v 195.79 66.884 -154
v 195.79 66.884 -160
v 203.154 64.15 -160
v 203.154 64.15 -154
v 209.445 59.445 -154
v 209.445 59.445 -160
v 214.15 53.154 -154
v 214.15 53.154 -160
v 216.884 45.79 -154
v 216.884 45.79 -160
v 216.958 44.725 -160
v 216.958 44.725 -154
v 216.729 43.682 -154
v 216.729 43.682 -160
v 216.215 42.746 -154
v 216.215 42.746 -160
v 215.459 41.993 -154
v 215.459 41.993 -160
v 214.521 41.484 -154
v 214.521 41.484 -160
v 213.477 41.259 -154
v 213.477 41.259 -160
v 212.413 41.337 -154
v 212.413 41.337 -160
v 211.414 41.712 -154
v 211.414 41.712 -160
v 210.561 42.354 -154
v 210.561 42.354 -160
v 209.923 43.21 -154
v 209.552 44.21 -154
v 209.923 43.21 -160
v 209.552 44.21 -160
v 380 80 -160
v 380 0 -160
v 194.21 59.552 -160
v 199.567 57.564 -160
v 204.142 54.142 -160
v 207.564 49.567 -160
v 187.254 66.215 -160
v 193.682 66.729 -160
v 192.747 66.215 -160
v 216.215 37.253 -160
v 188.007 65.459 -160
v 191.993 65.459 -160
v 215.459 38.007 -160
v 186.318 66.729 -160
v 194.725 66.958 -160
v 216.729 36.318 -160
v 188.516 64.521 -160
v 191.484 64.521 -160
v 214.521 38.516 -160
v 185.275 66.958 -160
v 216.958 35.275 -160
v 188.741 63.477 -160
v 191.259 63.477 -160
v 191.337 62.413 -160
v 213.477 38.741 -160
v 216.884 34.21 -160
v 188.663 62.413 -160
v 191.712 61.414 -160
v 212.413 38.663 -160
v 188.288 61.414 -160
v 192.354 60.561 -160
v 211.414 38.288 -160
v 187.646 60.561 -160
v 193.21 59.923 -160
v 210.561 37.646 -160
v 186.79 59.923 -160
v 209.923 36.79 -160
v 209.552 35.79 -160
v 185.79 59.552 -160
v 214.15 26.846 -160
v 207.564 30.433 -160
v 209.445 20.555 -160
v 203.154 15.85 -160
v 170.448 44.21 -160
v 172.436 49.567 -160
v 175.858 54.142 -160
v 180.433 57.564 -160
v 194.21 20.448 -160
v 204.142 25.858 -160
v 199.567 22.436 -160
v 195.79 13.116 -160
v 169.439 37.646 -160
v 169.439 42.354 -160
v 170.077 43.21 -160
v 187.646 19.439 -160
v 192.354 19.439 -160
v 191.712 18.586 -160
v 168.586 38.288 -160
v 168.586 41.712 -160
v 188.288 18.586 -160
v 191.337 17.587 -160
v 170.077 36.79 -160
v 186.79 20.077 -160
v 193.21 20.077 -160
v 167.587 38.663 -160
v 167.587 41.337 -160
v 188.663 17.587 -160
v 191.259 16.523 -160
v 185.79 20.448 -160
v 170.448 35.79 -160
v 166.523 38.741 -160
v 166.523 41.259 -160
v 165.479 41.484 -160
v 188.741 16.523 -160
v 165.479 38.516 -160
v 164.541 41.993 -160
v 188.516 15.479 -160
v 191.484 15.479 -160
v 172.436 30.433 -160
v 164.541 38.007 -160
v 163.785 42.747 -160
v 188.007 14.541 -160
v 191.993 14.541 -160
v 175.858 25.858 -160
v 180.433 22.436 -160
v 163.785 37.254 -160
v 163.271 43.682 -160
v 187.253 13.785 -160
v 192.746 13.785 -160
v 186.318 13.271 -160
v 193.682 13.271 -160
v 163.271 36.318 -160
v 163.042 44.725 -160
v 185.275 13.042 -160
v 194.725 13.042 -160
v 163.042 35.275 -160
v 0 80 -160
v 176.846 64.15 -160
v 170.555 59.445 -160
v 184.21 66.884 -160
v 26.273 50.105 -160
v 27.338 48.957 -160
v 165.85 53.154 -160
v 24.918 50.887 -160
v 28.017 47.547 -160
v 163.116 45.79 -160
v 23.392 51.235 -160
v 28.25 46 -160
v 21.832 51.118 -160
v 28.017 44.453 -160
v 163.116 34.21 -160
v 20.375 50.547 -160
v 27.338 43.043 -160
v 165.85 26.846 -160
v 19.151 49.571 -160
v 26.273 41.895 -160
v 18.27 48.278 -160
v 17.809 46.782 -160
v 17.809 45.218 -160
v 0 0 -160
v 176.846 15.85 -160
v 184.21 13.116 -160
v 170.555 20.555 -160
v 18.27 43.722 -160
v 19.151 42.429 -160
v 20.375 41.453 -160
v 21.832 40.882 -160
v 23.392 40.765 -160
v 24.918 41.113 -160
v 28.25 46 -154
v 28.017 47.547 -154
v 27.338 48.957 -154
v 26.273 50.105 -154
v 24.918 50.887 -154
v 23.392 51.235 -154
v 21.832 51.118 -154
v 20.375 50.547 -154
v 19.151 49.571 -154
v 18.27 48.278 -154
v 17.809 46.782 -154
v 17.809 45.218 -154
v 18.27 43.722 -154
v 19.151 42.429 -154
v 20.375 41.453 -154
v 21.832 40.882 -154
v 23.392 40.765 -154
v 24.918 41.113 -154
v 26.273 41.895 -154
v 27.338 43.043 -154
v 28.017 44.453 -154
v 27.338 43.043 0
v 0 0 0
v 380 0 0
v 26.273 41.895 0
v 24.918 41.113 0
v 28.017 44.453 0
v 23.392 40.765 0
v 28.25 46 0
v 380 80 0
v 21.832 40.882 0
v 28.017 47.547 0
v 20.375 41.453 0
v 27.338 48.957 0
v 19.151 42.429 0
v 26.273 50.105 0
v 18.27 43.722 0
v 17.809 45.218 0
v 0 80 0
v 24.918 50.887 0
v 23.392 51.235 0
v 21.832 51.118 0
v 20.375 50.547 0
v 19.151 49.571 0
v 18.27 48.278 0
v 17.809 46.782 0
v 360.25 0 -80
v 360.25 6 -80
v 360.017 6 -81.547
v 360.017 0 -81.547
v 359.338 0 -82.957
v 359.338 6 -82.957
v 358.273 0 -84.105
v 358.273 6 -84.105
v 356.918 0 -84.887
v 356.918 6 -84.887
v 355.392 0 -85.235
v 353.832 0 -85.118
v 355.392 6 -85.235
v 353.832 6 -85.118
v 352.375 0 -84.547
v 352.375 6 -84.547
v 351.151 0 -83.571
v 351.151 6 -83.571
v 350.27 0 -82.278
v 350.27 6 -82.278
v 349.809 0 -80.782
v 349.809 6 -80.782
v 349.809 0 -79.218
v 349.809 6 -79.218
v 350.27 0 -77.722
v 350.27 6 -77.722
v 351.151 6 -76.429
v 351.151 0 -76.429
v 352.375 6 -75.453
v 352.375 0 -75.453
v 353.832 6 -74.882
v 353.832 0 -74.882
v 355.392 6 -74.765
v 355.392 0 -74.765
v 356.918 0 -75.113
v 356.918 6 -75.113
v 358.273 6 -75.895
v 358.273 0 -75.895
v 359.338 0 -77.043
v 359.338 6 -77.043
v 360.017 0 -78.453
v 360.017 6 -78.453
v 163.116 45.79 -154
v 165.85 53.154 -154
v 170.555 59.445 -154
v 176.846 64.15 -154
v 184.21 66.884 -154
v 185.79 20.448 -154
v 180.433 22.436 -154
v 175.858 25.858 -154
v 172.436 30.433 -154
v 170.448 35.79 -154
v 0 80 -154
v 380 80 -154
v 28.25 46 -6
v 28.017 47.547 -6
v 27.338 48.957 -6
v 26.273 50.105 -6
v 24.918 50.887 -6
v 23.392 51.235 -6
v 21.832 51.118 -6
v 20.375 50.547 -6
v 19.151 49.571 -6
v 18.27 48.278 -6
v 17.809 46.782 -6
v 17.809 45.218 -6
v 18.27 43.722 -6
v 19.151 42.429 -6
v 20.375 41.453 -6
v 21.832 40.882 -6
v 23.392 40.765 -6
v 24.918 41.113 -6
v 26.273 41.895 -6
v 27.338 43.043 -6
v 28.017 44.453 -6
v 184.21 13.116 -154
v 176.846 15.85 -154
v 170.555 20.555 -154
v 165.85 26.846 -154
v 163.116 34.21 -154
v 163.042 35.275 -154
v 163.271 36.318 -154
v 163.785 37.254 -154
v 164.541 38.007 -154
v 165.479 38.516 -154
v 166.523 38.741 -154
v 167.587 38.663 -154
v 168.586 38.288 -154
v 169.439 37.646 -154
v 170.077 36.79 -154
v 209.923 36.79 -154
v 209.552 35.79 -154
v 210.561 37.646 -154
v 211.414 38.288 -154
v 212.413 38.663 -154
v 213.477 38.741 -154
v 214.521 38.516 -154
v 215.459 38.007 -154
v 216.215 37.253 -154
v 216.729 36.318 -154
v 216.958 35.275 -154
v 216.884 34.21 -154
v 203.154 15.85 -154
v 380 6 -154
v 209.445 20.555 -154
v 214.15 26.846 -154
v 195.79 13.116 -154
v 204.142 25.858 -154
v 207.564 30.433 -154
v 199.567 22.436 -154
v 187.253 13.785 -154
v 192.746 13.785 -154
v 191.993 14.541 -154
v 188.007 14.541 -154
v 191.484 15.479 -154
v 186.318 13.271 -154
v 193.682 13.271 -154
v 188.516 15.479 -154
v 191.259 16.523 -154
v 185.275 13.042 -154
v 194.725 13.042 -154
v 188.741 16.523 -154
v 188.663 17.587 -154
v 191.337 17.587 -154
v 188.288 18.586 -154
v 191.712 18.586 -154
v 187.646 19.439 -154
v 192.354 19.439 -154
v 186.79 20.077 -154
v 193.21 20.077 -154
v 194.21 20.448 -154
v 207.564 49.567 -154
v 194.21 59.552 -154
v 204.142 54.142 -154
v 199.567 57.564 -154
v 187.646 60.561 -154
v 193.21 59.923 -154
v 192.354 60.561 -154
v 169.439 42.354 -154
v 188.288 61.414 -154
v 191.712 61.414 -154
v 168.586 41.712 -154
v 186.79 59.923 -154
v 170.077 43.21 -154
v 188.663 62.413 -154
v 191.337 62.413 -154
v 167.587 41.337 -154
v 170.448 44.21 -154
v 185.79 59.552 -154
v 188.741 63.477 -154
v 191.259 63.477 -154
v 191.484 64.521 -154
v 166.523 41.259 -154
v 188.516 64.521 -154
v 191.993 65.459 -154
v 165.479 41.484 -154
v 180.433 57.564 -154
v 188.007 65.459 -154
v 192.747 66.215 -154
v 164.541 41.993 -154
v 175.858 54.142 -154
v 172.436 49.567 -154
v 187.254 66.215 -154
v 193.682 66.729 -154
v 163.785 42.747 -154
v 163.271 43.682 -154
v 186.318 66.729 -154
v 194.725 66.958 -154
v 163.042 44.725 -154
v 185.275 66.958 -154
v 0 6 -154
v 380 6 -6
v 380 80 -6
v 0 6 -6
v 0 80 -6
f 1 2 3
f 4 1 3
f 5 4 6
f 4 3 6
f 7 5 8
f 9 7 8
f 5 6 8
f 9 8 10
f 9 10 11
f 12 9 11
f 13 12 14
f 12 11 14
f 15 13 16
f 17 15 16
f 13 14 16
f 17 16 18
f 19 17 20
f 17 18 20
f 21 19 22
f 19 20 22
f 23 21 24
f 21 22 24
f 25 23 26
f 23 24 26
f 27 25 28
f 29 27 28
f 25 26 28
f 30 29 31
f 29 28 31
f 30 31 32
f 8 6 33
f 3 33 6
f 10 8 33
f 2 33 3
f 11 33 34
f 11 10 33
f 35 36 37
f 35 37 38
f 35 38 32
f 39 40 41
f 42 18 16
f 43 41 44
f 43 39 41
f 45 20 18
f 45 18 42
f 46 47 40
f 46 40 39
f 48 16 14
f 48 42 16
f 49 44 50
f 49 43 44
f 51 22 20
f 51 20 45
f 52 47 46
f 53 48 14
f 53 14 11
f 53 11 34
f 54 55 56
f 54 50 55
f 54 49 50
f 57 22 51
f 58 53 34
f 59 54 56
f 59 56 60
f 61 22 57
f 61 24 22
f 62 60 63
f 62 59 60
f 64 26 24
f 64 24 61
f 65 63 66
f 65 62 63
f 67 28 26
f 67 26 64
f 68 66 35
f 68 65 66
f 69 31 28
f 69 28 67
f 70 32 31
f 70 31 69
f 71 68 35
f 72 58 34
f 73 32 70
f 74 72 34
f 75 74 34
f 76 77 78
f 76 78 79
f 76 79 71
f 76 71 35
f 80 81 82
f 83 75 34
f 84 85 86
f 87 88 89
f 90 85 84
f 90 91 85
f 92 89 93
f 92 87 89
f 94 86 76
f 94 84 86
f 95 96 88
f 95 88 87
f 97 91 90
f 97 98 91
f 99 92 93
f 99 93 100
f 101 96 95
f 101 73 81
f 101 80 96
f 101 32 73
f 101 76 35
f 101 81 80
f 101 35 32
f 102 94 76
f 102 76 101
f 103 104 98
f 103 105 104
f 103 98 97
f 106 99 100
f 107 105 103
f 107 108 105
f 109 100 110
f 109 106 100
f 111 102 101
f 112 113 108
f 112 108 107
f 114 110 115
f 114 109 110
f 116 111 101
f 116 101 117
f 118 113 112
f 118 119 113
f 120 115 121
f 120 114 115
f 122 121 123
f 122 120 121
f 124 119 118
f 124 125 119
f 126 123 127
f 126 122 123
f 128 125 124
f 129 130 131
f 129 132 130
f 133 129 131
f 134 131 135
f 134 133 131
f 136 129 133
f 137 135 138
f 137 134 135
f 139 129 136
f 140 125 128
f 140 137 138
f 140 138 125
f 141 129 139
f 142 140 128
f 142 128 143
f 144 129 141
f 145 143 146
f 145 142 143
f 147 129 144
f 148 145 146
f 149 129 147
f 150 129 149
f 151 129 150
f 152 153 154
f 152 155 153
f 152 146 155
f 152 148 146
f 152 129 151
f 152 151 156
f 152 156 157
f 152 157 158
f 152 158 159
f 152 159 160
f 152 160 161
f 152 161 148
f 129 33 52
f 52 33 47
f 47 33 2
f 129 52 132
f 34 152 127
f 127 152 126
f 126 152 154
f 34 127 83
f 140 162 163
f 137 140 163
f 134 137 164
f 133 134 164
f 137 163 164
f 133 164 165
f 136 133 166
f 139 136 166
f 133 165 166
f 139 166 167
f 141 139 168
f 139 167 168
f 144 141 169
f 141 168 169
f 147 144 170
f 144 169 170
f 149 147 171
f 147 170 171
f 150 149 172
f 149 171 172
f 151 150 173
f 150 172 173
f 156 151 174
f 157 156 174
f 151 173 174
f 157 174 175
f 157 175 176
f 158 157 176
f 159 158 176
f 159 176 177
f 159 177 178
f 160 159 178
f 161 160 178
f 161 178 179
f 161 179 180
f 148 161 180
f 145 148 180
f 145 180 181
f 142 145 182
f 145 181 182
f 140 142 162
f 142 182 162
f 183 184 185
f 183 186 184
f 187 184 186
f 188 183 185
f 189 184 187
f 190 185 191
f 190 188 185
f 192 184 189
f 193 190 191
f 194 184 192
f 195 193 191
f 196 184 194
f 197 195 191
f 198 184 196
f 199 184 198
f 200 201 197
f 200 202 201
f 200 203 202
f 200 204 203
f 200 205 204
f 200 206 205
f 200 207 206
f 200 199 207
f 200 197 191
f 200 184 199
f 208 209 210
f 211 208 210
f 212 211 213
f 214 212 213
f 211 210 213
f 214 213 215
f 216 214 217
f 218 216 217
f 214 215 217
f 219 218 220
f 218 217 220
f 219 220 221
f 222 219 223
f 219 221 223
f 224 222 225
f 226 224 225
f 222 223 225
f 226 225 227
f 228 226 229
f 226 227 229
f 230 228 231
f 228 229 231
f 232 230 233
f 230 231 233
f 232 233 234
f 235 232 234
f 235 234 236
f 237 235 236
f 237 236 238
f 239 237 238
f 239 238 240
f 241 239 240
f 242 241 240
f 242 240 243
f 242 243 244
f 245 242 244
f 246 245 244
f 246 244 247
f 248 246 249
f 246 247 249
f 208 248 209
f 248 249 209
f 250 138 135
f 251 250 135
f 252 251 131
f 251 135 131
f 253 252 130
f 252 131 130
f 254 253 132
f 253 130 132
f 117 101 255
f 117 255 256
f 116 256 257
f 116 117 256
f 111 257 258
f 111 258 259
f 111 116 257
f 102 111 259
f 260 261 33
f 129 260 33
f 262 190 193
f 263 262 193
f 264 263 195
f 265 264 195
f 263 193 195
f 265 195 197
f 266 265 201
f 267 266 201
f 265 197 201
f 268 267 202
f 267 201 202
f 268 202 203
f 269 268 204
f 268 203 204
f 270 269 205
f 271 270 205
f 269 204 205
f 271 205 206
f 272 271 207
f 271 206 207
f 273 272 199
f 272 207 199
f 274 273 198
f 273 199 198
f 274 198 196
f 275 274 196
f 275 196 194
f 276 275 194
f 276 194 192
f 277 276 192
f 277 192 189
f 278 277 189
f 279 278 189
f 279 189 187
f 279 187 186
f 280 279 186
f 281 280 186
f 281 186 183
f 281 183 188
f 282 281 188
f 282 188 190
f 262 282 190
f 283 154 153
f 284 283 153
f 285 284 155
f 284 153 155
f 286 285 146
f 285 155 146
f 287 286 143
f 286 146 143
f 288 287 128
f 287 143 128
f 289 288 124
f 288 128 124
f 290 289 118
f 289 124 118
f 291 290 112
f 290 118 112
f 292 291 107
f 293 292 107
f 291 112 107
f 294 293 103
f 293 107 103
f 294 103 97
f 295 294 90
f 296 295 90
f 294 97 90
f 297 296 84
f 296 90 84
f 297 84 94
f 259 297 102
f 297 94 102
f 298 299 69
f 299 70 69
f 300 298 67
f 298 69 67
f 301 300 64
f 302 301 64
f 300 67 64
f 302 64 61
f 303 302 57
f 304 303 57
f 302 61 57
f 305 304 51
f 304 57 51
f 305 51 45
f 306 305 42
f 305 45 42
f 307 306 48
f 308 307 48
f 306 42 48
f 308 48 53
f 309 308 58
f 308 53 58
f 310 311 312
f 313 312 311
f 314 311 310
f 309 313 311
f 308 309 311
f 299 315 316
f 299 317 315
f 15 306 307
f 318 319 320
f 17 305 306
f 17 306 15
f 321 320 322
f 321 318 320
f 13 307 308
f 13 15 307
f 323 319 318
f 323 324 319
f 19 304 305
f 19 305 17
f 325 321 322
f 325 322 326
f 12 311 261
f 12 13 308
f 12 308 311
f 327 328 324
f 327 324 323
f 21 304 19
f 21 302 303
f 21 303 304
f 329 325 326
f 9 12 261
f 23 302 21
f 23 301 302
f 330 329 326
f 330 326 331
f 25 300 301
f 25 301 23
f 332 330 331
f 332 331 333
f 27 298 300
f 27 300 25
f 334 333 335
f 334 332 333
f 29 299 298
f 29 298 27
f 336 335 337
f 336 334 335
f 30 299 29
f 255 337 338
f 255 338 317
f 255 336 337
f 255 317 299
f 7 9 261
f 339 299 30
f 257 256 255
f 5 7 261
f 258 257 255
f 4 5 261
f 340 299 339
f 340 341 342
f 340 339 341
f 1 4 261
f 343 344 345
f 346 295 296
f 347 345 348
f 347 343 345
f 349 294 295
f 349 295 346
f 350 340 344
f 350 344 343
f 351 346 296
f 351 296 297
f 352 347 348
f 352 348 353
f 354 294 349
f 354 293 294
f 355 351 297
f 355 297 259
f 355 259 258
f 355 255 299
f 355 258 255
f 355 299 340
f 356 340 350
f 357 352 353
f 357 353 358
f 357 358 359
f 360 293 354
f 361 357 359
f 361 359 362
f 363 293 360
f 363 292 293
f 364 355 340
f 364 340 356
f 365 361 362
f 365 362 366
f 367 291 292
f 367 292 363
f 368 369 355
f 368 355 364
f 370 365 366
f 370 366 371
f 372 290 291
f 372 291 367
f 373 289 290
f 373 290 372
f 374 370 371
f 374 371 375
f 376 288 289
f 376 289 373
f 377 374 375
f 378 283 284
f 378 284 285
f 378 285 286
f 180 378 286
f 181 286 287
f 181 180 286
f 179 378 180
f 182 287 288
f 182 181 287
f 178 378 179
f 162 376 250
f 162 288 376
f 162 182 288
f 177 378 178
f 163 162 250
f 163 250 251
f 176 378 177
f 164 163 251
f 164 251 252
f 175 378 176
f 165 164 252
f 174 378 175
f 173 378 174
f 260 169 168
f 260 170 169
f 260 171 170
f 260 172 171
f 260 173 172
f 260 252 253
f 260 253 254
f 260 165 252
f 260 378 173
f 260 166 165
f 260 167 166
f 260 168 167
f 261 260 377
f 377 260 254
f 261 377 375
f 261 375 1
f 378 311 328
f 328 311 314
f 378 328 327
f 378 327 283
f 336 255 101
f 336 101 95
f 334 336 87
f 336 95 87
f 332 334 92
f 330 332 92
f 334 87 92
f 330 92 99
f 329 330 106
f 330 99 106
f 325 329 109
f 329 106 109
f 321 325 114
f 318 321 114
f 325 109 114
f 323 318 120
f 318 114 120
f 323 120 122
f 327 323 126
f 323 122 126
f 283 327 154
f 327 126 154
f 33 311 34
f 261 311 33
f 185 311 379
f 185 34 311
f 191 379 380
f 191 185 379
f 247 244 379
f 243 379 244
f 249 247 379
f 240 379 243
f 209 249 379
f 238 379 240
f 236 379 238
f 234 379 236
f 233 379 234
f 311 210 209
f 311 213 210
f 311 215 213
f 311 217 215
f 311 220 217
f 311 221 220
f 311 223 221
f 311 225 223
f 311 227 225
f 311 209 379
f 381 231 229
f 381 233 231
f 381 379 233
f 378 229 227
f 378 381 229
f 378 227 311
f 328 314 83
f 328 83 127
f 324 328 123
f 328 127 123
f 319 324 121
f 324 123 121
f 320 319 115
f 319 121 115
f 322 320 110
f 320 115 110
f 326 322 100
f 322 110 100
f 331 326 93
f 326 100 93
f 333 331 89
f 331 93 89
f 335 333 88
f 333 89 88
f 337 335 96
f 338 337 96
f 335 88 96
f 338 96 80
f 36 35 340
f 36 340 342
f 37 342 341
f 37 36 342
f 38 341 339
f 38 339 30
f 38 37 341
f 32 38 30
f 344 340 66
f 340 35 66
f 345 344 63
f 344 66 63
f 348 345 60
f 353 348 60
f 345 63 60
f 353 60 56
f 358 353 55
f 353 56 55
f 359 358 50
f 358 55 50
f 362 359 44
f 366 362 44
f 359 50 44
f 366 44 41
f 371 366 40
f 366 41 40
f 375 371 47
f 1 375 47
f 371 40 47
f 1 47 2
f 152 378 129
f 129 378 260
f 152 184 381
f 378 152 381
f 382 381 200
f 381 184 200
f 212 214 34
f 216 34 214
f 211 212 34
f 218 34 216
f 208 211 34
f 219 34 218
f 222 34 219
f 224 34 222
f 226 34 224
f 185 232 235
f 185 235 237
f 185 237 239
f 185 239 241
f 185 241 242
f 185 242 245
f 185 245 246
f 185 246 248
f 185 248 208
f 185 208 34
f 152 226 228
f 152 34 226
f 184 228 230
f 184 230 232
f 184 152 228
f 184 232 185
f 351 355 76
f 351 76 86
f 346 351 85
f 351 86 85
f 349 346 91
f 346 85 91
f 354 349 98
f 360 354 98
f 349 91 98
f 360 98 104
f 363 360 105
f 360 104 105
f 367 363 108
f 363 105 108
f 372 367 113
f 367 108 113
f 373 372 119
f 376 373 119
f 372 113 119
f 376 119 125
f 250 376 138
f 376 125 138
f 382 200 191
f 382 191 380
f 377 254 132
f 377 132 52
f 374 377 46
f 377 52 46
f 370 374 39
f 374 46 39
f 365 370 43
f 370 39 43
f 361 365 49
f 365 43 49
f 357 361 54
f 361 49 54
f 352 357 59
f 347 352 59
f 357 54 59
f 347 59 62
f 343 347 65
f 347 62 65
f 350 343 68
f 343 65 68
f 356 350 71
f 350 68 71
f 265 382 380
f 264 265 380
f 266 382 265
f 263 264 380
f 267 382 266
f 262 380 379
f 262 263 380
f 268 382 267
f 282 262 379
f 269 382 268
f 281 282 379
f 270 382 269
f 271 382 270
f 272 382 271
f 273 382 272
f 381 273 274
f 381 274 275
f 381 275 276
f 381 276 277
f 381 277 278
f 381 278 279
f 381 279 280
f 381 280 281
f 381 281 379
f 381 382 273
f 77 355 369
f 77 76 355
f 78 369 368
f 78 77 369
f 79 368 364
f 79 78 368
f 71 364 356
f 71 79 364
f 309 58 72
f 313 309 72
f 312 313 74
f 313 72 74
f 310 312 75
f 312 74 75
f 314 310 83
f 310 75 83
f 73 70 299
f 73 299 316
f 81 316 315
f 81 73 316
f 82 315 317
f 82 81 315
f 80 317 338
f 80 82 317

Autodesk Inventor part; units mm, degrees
ref_plane "YZ Plane" through (0, 0, 0) normal (1, 0, 0) x (0, 1, 0)
ref_plane "XZ Plane" through (0, 0, 0) normal (0, 1, 0) x (-1, 0, 0)
ref_plane "XY Plane" through (0, 0, 0) normal (0, 0, 1) x (1, 0, 0)
sketch "Náčrt1" plane through (0, 0, 0) normal (1, 0, 0) x (0, 1, 0)
  line L0 (0, 0) -> (80, 0)
  line L1 (80, 0) -> (80, -6)
  line L2 (80, -6) -> (6, -6)
  line L3 (6, -6) -> (6, -154)
  line L4 (6, -154) -> (80, -154)
  line L5 (80, -154) -> (80, -160)
  line L6 (80, -160) -> (0, -160)
  line L7 (0, -160) -> (0, 0)
  dimension "d0" = 80
  dimension "d1" = 6
  dimension "d3" = 148
  dimension "d5" = 6
  dimension "d6" = 80
  dimension "d20" = 160
  dimension "d21" = 74
extrude "Vysunutí1" add sketch "Náčrt1" along normal blind 380
sketch "Náčrt4" plane through (0, 6, -6) normal (0, 1, 0) x (1, 0, 0)
  line L0 (0, 0) -> (0, 148) projected
  line L1 (0, 0) -> (380, 0) projected
  line L2 (380, 148) -> (380, 0) projected
  line L3 (0, 148) -> (380, 148) projected
  circle A0 centre (355, 74) radius 5.25
  line L4 (0, 154) -> (380, 154) projected
  point P0 (0, -6)
  dimension "d14" = 25
  dimension "d15" = 80
  dimension "d16" = 10.5
extrude "Vysunutí3" cut sketch "Náčrt4" against normal through all contours A0
sketch "Náčrt5" plane through (0, 0, 0) normal (0, 0, 1) x (1, 0, 0)
  circle A0 centre (23, 46) radius 5.25
  line L0 (380, 80) -> (380, 0) projected
  line L1 (0, 0) -> (380, 0) projected
  dimension "d22" = 10.5
  dimension "d23" = 357
  dimension "d24" = 46
extrude "Vysunutí4" cut sketch "Náčrt5" against normal through all
sketch "Náčrt6" plane through (0, 0, -160) normal (0, 0, -1) x (-1, 0, 0)
  circle A0 centre (-23, 46) radius 5.25 projected
  line L0 (0, 80) -> (0, 0) projected
  line L1 (0, 80) -> (-380, 80) projected
  line L2 (-380, 0) -> (-380, 80) projected
  line L3 (0, 0) -> (-380, 0) projected
  line L4 (-219.2388, 40) -> (-154.125, 40)
  line L5 (-190, 7.0383) -> (-190, 75.4408)
  arc A1 (-216.8837, 45.7895) -> (-209.5518, 44.2105) centre (-213.2177, 45) ccw
  arc A2 (-209.5518, 35.7895) -> (-216.8837, 34.2105) centre (-213.2177, 35) ccw
  arc A3 (-195.7895, 13.1163) -> (-194.2105, 20.4482) centre (-195, 16.7823) ccw
  arc A4 (-185.7895, 20.4482) -> (-184.2105, 13.1163) centre (-185, 16.7823) ccw
  arc A5 (-163.1163, 34.2105) -> (-170.4482, 35.7895) centre (-166.7823, 35) ccw
  arc A6 (-170.4482, 44.2105) -> (-163.1163, 45.7895) centre (-166.7823, 45) ccw
  arc A7 (-184.2105, 66.8837) -> (-185.7895, 59.5518) centre (-185, 63.2177) ccw
  arc A8 (-194.2105, 59.5518) -> (-195.7895, 66.8837) centre (-195, 63.2177) ccw
  arc A9 (-194.2105, 59.5518) -> (-209.5518, 44.2105) centre (-190, 40) ccw
  arc A10 (-195.7895, 66.8837) -> (-216.8837, 45.7895) centre (-190, 40) ccw
  arc A11 (-163.1163, 45.7895) -> (-184.2105, 66.8837) centre (-190, 40) ccw
  arc A12 (-170.4482, 44.2105) -> (-185.7895, 59.5518) centre (-190, 40) ccw
  arc A13 (-216.8837, 34.2105) -> (-195.7895, 13.1163) centre (-190, 40) ccw
  arc A14 (-184.2105, 13.1163) -> (-163.1163, 34.2105) centre (-190, 40) ccw
  arc A15 (-209.5518, 35.7895) -> (-194.2105, 20.4482) centre (-190, 40) ccw
  arc A16 (-185.7895, 20.4482) -> (-170.4482, 35.7895) centre (-190, 40) ccw
  point P0 (0, 0)
  dimension "d22" = 10.5
  dimension "d29" = 190
  dimension "d30" = 40
  dimension "d31" = 5
  dimension "d32" = 5
  dimension "d35" = 360
extrude "Vysunutí5" cut sketch "Náčrt6" against normal up to surface (6 mm away) contours A10 A8 A9 A1 | A15 A3 A13 A2 | A16 A5 A14 A4 | A12 A7 A11 A6
properties part number "U profil"
